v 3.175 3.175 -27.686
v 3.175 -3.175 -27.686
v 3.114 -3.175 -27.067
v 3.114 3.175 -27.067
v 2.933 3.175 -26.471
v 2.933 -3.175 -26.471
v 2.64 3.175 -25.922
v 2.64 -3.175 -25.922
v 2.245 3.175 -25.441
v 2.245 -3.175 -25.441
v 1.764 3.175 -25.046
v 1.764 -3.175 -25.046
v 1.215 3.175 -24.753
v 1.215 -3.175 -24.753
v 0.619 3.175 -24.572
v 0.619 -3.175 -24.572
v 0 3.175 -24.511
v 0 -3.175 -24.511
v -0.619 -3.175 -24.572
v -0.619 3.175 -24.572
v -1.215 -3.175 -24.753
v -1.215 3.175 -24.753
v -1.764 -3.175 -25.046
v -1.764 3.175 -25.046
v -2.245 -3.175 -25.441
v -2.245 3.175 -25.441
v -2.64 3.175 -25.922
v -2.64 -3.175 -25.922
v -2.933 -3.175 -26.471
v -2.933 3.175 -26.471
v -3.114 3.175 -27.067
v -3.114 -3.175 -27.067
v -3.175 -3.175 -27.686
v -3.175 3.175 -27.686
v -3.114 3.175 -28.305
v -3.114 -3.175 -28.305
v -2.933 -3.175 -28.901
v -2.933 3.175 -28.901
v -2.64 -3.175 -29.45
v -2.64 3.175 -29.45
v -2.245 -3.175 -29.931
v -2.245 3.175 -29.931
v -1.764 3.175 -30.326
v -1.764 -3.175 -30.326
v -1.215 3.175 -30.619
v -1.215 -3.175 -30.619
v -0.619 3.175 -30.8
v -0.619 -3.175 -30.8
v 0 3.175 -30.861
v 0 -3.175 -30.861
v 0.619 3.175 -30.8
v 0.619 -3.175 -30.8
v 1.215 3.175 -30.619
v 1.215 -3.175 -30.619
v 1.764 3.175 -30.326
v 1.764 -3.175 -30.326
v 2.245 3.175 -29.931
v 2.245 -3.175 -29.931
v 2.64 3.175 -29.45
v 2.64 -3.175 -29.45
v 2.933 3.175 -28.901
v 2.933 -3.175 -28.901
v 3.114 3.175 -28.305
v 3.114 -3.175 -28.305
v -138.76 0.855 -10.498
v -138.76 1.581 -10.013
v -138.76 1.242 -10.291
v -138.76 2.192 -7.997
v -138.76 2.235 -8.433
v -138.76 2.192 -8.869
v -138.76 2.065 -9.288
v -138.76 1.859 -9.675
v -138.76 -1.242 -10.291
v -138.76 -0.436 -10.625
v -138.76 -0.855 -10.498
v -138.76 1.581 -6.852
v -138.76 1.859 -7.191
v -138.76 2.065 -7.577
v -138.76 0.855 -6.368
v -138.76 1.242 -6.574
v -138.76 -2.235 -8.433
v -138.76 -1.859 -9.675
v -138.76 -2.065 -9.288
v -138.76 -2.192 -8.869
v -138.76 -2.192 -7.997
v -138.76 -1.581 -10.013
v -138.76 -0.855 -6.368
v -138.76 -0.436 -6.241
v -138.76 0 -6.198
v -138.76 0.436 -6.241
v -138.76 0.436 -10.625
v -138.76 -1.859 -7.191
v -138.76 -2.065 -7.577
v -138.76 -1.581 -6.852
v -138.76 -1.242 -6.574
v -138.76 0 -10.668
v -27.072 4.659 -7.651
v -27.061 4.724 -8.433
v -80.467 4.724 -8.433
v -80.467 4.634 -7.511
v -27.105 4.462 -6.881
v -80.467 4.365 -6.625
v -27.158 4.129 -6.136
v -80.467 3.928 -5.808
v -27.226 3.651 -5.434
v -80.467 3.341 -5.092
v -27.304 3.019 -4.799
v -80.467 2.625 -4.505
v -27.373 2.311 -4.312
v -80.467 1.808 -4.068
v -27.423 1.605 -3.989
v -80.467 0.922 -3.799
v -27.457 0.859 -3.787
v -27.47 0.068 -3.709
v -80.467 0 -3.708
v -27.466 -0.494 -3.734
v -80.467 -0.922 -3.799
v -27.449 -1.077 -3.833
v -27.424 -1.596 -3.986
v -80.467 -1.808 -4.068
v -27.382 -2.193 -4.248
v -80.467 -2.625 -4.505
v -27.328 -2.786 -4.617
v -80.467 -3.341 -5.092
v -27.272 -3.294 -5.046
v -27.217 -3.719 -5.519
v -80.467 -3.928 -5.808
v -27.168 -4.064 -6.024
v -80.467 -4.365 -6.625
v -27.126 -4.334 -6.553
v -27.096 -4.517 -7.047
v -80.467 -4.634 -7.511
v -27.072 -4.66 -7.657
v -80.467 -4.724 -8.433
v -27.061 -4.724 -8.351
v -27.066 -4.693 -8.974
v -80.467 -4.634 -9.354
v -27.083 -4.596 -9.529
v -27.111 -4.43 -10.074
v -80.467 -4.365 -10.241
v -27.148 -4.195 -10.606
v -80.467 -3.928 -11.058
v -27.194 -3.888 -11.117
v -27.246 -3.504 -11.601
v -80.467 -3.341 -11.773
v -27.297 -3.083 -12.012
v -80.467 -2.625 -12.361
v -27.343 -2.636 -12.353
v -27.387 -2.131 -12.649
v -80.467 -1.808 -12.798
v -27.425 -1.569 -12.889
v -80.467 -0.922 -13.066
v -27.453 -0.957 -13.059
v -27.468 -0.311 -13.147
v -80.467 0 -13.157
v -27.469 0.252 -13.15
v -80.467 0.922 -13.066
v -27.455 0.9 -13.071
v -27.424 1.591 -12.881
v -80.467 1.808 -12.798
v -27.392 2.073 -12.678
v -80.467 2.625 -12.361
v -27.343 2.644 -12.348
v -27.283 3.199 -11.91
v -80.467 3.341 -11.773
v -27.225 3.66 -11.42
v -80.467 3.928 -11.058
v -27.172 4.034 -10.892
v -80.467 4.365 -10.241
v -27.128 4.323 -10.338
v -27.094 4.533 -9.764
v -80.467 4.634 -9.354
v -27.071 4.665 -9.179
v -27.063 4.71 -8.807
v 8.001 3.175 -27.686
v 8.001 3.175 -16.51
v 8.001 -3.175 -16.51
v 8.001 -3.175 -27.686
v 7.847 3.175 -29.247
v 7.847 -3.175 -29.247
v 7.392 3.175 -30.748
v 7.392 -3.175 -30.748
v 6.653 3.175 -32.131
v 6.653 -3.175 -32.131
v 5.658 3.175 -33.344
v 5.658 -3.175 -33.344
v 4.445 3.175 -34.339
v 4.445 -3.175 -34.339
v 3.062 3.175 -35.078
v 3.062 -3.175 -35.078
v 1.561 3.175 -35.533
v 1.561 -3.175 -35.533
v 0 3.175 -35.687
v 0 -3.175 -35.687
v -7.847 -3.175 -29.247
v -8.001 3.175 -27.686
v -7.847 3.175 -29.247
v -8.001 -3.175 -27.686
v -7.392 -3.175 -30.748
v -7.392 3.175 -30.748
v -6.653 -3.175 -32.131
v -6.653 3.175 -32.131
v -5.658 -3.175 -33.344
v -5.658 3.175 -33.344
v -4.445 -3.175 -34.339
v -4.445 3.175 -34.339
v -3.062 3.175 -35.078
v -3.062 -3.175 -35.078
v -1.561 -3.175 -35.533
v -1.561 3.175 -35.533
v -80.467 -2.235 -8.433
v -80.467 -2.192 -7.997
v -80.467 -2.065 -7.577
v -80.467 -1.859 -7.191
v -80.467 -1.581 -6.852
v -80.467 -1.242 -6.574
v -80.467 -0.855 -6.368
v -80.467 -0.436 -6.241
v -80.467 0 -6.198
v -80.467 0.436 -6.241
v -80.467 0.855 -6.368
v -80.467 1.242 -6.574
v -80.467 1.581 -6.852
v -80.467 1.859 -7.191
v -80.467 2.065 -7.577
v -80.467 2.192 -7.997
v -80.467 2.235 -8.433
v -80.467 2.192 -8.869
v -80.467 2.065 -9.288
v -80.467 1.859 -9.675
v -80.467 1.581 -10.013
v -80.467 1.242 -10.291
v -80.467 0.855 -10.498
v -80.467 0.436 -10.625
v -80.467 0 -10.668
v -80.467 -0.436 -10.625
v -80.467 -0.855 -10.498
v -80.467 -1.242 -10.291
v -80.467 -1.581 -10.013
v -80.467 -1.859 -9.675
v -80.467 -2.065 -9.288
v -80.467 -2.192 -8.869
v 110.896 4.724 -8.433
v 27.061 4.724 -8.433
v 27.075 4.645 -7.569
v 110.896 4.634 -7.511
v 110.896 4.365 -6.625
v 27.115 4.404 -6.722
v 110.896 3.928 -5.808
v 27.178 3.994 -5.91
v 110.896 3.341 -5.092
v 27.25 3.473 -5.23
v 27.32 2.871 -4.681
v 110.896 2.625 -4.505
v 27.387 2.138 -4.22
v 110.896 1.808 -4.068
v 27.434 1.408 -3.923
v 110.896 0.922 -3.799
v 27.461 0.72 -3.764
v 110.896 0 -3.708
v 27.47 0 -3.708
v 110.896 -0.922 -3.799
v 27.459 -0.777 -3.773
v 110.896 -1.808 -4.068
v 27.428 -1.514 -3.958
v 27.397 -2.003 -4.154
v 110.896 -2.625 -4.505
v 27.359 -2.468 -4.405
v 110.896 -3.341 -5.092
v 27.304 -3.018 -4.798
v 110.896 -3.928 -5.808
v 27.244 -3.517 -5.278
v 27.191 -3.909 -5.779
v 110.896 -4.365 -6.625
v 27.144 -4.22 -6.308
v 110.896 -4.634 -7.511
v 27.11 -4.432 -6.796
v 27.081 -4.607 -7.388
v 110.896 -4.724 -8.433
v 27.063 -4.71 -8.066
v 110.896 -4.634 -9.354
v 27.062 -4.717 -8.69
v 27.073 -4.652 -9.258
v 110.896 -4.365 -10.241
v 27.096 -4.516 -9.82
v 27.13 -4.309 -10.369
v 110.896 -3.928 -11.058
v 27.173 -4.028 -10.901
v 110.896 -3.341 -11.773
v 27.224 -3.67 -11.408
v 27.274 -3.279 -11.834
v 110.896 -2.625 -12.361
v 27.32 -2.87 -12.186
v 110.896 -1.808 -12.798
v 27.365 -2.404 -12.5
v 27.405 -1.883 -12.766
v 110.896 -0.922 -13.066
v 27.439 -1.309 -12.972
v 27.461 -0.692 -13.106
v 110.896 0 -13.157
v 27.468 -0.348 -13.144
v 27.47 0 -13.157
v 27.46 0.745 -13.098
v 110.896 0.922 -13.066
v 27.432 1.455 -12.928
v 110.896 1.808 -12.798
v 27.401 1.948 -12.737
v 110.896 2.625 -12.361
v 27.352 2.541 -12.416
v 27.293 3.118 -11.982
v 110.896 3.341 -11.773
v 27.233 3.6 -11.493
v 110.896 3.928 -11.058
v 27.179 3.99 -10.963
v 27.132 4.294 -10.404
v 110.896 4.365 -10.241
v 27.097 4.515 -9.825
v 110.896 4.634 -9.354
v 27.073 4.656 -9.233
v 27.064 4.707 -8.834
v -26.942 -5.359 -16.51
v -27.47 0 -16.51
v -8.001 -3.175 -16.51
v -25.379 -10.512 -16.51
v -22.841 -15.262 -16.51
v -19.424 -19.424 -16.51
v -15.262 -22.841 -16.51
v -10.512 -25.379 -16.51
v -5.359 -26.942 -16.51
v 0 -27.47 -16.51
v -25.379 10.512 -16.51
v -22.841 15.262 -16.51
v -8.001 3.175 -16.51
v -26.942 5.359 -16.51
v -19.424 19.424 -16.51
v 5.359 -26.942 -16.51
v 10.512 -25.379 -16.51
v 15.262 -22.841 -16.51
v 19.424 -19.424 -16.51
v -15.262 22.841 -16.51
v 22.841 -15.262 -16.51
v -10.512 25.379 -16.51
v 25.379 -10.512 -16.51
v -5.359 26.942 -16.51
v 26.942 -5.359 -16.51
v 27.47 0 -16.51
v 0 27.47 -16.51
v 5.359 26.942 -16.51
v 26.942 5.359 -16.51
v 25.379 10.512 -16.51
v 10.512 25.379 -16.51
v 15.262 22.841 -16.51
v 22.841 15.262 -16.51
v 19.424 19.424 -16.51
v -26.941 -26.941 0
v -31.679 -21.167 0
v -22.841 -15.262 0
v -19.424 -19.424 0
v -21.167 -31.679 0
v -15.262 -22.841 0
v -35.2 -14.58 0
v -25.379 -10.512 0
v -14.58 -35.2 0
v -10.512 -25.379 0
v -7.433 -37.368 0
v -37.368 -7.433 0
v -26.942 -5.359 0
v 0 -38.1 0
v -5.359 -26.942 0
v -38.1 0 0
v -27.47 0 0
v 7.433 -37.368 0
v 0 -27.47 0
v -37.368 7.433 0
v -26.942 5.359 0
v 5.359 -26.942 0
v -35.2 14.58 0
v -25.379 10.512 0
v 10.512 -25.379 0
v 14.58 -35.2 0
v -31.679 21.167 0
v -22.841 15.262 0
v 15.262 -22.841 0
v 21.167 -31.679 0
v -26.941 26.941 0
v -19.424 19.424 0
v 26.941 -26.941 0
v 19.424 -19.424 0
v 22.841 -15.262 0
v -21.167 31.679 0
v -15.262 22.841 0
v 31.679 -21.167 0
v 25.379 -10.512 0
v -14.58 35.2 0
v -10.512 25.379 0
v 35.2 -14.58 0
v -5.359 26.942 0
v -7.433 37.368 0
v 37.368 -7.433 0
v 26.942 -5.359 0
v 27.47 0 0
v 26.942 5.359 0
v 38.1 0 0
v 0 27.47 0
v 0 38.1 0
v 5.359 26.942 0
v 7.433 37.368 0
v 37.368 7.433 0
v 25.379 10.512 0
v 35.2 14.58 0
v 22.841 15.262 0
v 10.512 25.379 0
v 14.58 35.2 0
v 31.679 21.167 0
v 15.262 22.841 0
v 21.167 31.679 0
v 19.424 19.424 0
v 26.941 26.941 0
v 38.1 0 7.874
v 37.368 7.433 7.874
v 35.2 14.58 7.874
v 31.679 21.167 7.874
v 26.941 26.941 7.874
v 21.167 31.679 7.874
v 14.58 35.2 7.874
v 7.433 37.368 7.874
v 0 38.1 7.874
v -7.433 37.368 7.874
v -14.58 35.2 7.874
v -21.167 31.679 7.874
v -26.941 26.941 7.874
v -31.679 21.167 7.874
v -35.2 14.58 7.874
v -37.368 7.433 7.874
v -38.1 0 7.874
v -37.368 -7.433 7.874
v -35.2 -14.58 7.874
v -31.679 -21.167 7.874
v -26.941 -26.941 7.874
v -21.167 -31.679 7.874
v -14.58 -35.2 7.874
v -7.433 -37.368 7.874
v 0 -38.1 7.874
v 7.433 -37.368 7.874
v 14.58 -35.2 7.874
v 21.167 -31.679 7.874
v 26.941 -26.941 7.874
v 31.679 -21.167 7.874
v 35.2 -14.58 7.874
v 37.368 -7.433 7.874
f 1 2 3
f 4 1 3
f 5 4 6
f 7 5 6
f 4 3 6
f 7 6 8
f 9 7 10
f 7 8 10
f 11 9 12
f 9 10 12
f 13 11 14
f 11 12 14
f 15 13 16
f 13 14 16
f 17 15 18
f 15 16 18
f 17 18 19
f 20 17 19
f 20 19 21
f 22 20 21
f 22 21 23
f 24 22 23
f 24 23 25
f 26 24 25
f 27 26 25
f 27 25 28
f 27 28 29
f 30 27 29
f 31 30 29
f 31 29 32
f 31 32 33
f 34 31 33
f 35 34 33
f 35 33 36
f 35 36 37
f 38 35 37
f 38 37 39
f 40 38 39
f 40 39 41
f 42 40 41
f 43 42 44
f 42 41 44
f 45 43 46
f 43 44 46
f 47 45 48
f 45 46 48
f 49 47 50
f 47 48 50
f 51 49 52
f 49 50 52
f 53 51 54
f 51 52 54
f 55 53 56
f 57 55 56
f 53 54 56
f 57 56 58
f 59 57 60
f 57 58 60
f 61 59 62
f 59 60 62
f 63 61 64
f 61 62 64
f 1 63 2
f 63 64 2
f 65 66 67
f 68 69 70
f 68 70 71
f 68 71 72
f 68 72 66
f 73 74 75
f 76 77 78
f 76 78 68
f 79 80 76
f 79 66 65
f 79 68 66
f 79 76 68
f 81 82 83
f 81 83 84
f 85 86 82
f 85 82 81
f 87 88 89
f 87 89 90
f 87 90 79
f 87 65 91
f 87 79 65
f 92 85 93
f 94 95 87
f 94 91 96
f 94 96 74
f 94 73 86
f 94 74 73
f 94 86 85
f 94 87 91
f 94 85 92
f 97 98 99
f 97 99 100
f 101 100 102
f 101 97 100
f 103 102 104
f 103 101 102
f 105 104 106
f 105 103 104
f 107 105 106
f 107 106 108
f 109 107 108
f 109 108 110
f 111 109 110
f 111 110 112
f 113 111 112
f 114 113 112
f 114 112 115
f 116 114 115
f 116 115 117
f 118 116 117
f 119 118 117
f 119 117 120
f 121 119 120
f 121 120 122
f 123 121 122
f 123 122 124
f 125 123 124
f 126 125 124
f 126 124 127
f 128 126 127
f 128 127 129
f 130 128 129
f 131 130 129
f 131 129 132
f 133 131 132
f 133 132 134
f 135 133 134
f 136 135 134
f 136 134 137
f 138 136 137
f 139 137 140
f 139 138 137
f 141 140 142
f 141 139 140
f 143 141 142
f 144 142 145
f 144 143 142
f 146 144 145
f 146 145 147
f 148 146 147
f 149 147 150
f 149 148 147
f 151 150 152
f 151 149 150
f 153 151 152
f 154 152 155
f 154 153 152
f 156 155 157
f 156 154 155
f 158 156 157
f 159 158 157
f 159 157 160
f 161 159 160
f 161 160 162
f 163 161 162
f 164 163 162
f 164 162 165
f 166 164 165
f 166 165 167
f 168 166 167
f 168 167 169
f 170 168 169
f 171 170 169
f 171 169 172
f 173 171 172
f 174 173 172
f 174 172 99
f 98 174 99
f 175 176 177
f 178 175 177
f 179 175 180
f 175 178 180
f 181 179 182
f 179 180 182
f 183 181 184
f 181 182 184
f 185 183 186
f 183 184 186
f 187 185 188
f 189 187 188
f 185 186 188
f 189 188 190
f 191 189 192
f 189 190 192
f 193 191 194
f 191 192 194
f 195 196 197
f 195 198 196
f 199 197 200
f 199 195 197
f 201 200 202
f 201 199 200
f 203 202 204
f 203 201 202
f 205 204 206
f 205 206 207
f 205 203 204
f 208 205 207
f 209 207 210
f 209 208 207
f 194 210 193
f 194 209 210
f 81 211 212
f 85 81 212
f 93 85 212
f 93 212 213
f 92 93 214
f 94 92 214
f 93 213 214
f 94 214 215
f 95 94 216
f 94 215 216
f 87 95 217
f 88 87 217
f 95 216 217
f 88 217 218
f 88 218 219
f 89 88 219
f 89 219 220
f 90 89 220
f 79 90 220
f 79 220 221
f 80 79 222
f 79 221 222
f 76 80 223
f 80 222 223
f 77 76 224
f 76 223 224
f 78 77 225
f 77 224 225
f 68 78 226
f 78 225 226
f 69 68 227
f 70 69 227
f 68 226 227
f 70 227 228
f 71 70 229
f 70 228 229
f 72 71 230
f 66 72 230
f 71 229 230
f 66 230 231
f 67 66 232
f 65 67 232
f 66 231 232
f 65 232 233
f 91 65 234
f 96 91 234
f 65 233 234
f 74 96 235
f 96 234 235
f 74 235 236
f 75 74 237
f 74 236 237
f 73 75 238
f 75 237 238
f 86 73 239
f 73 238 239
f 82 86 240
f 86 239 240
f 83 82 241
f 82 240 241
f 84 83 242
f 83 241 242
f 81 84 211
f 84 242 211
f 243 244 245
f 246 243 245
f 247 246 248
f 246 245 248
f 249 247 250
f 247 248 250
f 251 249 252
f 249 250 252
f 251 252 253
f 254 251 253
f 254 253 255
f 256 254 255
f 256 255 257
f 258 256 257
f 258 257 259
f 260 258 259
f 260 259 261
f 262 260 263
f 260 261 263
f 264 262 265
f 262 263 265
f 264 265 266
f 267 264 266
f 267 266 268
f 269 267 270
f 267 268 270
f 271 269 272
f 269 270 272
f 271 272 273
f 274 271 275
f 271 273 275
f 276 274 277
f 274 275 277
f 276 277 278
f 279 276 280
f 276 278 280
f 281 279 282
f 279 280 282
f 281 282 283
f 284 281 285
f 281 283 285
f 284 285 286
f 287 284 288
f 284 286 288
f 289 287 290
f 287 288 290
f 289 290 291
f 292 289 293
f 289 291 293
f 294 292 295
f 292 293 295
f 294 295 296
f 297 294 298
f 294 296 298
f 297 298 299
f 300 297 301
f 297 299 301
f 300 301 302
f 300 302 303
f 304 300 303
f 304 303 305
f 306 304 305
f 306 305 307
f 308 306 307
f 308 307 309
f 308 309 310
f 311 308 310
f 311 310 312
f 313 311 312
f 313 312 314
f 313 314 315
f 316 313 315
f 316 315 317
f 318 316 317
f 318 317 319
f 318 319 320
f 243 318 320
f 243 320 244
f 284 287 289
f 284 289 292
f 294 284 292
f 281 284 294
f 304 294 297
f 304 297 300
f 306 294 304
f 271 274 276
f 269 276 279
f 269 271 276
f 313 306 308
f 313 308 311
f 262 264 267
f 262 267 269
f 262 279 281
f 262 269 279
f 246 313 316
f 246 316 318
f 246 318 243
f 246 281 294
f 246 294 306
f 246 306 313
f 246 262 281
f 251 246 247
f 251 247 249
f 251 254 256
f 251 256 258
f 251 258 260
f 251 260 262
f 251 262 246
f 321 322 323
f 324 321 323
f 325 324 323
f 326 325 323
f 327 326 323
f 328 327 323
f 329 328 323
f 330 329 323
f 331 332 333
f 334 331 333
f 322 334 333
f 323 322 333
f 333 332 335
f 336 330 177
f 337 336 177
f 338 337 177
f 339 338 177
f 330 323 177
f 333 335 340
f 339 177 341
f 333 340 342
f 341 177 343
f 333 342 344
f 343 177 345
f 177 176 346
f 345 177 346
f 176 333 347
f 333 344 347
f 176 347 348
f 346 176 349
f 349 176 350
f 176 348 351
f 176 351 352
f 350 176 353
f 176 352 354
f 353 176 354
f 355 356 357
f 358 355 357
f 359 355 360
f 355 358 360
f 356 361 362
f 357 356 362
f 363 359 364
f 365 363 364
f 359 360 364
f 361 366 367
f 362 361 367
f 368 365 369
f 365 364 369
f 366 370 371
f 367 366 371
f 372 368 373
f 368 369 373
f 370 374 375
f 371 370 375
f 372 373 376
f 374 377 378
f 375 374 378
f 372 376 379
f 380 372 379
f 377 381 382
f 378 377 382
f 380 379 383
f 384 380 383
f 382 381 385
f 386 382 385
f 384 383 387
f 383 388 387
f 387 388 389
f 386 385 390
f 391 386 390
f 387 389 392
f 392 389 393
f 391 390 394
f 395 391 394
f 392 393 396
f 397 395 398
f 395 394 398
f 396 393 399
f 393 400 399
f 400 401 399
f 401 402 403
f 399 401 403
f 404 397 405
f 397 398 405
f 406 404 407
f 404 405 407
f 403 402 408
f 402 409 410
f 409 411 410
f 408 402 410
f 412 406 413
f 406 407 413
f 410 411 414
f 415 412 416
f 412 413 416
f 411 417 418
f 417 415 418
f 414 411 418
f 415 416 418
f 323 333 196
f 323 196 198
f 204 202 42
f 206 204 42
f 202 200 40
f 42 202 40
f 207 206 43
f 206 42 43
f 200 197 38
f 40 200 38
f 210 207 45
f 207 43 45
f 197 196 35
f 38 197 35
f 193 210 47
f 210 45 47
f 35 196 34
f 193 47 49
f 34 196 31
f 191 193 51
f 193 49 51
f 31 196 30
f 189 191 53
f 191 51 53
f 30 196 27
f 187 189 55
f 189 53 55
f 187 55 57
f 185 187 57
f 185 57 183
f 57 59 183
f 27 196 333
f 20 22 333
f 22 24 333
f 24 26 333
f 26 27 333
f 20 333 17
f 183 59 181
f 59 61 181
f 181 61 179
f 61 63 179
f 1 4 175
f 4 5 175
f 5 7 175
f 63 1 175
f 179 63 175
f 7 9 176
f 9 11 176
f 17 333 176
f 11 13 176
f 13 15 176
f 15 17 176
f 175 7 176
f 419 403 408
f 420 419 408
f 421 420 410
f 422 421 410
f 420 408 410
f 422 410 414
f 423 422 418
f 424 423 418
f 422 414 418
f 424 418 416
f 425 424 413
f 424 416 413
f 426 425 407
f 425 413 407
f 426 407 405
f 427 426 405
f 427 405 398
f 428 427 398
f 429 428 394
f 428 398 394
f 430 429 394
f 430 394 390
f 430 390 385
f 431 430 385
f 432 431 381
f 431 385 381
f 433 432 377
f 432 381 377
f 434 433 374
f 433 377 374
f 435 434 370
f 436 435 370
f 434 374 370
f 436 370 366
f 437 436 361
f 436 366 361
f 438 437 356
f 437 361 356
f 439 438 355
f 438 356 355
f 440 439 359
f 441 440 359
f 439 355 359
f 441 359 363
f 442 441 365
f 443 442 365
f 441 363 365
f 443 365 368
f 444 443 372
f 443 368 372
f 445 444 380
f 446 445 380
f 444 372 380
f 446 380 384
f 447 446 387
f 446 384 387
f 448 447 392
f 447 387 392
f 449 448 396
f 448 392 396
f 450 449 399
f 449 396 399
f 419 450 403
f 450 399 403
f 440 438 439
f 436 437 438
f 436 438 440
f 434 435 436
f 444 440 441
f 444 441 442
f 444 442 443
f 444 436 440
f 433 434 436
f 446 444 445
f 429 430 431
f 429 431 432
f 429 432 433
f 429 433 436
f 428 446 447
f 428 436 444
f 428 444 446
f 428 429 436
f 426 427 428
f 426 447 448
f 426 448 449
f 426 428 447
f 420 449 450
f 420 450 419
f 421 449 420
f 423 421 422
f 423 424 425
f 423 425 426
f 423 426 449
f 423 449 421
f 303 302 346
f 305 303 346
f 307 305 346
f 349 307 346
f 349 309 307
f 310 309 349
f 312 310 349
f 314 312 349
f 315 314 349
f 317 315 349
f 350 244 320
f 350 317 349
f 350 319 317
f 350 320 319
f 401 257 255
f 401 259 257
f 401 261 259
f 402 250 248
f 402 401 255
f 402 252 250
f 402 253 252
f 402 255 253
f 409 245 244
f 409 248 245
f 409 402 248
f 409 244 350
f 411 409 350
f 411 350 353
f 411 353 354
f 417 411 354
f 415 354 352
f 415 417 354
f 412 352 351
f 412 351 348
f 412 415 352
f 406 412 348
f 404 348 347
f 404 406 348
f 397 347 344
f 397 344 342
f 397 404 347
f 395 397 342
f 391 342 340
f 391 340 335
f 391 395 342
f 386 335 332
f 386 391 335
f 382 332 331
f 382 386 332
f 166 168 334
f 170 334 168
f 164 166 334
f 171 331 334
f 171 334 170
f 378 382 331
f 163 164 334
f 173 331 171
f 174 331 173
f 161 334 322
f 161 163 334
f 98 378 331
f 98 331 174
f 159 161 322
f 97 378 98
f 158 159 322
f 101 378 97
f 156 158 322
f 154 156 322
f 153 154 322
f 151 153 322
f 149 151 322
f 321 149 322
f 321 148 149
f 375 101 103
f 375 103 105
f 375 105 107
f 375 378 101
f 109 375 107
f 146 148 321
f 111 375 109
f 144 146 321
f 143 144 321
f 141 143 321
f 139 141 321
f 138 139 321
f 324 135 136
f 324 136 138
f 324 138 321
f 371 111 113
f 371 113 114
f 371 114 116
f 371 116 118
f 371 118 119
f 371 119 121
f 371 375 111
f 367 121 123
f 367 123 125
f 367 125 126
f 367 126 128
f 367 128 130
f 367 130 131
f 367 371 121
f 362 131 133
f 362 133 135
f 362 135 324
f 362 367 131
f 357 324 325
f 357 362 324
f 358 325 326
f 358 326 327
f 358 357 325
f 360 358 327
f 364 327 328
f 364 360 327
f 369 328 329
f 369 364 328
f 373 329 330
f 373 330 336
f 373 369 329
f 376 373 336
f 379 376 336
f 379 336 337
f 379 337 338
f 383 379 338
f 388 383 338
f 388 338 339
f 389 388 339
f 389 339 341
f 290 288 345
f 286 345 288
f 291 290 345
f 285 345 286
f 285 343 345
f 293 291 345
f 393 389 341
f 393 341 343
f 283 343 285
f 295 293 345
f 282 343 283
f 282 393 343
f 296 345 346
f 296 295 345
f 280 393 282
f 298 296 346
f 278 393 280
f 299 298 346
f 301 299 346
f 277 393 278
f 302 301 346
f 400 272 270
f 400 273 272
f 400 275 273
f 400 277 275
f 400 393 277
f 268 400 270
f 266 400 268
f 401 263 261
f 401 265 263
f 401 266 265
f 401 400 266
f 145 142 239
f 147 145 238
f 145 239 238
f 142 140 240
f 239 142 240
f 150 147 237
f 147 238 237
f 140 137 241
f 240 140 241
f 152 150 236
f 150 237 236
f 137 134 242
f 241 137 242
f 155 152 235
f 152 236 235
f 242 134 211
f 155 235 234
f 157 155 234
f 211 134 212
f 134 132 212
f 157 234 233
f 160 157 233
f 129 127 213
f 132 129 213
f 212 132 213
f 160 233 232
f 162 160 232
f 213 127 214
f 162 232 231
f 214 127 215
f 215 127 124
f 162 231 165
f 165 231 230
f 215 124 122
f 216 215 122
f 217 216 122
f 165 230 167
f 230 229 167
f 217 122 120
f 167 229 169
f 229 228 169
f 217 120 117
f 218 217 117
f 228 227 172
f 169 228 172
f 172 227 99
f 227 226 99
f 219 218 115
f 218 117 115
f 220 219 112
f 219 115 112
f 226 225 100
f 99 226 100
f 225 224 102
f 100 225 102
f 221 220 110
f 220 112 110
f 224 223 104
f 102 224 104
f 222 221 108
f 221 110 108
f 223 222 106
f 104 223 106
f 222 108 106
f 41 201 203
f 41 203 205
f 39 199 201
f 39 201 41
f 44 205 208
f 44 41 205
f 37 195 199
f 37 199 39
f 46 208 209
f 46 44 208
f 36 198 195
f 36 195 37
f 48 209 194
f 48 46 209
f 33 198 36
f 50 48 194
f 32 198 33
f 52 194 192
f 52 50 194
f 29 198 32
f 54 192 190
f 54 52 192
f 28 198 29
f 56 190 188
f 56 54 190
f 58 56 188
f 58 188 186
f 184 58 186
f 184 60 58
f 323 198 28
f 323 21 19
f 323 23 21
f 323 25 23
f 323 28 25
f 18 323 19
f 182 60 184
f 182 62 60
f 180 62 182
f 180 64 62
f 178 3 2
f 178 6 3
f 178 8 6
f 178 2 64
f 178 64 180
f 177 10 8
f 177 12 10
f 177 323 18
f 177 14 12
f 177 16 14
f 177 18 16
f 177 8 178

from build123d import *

# Parameters (mm, degrees)
F0_R      = 38.1
F1_DEPTH  = 7.874
F2_R      = 27.4701
F3_DEPTH  = 16.51
F4_R      = 4.7244
F5_DEPTH  = 110.8964
F6_DEPTH  = 80.4672
F7_R      = 2.2352
F8_DEPTH  = 58.293
F9_W      = 16.002
F9_H      = 6.35
F10_DEPTH = 19.177
F11_R     = 8.00099
F13_D     = 6.35


# Not quite as in the source:
# - a fillet or chamfer is up to 0.001 mm smaller than in the source, because OpenCascade refuses the exact size


with BuildPart() as f1:
    # F0 (on Top) → F1 (new body)
    with BuildSketch(Plane.XY):
        Circle(F0_R)
    extrude(amount=F1_DEPTH)

    # F2 (on Top) → F3 (join)
    with BuildSketch(Plane.XY):
        Circle(F2_R)
    extrude(amount=-F3_DEPTH)

    # F4 (on Right) → F5 (join)
    with BuildSketch(Plane.YZ):
        with Locations((0, -8.4328)):
            Circle(F4_R)
    extrude(amount=F5_DEPTH)

    # F4 (on Right) → F6 (join)
    with BuildSketch(Plane.YZ):
        with Locations((0, -8.4328)):
            Circle(F4_R)
    extrude(amount=-F6_DEPTH)

    # F7 (on face) → F8 (join)
    with BuildSketch(Plane(origin=(-80.4672, 0, 0), x_dir=(0, -1, 0), z_dir=(-1, 0, 0))):
        with Locations((0, -8.4328)):
            Circle(F7_R)
    extrude(amount=F8_DEPTH)

    # F9 (on face) → F10 (join)
    with BuildSketch(Plane(origin=(0, 0, -16.51), x_dir=(1, 0, 0), z_dir=(0, 0, -1))):
        Rectangle(F9_W, F9_H)
    extrude(amount=F10_DEPTH)

    # F11 (radius 8.001 in the source; OpenCascade refuses exactly that, so slightly less here)
    f11_edges = [f1.edges().sort_by_distance(p)[0] for p in [
        (8.001, 0, -35.687),
        (-8.001, 0, -35.687),
    ]]
    fillet(f11_edges, radius=F11_R)

    # F13 (through all)
    with Locations(Plane(origin=(0, 3.175, 0), x_dir=(-1, 0, 0), z_dir=(0, 1, 0))):
        with Locations((0, -27.686)):
            Hole(F13_D / 2)


solid = f1.part
